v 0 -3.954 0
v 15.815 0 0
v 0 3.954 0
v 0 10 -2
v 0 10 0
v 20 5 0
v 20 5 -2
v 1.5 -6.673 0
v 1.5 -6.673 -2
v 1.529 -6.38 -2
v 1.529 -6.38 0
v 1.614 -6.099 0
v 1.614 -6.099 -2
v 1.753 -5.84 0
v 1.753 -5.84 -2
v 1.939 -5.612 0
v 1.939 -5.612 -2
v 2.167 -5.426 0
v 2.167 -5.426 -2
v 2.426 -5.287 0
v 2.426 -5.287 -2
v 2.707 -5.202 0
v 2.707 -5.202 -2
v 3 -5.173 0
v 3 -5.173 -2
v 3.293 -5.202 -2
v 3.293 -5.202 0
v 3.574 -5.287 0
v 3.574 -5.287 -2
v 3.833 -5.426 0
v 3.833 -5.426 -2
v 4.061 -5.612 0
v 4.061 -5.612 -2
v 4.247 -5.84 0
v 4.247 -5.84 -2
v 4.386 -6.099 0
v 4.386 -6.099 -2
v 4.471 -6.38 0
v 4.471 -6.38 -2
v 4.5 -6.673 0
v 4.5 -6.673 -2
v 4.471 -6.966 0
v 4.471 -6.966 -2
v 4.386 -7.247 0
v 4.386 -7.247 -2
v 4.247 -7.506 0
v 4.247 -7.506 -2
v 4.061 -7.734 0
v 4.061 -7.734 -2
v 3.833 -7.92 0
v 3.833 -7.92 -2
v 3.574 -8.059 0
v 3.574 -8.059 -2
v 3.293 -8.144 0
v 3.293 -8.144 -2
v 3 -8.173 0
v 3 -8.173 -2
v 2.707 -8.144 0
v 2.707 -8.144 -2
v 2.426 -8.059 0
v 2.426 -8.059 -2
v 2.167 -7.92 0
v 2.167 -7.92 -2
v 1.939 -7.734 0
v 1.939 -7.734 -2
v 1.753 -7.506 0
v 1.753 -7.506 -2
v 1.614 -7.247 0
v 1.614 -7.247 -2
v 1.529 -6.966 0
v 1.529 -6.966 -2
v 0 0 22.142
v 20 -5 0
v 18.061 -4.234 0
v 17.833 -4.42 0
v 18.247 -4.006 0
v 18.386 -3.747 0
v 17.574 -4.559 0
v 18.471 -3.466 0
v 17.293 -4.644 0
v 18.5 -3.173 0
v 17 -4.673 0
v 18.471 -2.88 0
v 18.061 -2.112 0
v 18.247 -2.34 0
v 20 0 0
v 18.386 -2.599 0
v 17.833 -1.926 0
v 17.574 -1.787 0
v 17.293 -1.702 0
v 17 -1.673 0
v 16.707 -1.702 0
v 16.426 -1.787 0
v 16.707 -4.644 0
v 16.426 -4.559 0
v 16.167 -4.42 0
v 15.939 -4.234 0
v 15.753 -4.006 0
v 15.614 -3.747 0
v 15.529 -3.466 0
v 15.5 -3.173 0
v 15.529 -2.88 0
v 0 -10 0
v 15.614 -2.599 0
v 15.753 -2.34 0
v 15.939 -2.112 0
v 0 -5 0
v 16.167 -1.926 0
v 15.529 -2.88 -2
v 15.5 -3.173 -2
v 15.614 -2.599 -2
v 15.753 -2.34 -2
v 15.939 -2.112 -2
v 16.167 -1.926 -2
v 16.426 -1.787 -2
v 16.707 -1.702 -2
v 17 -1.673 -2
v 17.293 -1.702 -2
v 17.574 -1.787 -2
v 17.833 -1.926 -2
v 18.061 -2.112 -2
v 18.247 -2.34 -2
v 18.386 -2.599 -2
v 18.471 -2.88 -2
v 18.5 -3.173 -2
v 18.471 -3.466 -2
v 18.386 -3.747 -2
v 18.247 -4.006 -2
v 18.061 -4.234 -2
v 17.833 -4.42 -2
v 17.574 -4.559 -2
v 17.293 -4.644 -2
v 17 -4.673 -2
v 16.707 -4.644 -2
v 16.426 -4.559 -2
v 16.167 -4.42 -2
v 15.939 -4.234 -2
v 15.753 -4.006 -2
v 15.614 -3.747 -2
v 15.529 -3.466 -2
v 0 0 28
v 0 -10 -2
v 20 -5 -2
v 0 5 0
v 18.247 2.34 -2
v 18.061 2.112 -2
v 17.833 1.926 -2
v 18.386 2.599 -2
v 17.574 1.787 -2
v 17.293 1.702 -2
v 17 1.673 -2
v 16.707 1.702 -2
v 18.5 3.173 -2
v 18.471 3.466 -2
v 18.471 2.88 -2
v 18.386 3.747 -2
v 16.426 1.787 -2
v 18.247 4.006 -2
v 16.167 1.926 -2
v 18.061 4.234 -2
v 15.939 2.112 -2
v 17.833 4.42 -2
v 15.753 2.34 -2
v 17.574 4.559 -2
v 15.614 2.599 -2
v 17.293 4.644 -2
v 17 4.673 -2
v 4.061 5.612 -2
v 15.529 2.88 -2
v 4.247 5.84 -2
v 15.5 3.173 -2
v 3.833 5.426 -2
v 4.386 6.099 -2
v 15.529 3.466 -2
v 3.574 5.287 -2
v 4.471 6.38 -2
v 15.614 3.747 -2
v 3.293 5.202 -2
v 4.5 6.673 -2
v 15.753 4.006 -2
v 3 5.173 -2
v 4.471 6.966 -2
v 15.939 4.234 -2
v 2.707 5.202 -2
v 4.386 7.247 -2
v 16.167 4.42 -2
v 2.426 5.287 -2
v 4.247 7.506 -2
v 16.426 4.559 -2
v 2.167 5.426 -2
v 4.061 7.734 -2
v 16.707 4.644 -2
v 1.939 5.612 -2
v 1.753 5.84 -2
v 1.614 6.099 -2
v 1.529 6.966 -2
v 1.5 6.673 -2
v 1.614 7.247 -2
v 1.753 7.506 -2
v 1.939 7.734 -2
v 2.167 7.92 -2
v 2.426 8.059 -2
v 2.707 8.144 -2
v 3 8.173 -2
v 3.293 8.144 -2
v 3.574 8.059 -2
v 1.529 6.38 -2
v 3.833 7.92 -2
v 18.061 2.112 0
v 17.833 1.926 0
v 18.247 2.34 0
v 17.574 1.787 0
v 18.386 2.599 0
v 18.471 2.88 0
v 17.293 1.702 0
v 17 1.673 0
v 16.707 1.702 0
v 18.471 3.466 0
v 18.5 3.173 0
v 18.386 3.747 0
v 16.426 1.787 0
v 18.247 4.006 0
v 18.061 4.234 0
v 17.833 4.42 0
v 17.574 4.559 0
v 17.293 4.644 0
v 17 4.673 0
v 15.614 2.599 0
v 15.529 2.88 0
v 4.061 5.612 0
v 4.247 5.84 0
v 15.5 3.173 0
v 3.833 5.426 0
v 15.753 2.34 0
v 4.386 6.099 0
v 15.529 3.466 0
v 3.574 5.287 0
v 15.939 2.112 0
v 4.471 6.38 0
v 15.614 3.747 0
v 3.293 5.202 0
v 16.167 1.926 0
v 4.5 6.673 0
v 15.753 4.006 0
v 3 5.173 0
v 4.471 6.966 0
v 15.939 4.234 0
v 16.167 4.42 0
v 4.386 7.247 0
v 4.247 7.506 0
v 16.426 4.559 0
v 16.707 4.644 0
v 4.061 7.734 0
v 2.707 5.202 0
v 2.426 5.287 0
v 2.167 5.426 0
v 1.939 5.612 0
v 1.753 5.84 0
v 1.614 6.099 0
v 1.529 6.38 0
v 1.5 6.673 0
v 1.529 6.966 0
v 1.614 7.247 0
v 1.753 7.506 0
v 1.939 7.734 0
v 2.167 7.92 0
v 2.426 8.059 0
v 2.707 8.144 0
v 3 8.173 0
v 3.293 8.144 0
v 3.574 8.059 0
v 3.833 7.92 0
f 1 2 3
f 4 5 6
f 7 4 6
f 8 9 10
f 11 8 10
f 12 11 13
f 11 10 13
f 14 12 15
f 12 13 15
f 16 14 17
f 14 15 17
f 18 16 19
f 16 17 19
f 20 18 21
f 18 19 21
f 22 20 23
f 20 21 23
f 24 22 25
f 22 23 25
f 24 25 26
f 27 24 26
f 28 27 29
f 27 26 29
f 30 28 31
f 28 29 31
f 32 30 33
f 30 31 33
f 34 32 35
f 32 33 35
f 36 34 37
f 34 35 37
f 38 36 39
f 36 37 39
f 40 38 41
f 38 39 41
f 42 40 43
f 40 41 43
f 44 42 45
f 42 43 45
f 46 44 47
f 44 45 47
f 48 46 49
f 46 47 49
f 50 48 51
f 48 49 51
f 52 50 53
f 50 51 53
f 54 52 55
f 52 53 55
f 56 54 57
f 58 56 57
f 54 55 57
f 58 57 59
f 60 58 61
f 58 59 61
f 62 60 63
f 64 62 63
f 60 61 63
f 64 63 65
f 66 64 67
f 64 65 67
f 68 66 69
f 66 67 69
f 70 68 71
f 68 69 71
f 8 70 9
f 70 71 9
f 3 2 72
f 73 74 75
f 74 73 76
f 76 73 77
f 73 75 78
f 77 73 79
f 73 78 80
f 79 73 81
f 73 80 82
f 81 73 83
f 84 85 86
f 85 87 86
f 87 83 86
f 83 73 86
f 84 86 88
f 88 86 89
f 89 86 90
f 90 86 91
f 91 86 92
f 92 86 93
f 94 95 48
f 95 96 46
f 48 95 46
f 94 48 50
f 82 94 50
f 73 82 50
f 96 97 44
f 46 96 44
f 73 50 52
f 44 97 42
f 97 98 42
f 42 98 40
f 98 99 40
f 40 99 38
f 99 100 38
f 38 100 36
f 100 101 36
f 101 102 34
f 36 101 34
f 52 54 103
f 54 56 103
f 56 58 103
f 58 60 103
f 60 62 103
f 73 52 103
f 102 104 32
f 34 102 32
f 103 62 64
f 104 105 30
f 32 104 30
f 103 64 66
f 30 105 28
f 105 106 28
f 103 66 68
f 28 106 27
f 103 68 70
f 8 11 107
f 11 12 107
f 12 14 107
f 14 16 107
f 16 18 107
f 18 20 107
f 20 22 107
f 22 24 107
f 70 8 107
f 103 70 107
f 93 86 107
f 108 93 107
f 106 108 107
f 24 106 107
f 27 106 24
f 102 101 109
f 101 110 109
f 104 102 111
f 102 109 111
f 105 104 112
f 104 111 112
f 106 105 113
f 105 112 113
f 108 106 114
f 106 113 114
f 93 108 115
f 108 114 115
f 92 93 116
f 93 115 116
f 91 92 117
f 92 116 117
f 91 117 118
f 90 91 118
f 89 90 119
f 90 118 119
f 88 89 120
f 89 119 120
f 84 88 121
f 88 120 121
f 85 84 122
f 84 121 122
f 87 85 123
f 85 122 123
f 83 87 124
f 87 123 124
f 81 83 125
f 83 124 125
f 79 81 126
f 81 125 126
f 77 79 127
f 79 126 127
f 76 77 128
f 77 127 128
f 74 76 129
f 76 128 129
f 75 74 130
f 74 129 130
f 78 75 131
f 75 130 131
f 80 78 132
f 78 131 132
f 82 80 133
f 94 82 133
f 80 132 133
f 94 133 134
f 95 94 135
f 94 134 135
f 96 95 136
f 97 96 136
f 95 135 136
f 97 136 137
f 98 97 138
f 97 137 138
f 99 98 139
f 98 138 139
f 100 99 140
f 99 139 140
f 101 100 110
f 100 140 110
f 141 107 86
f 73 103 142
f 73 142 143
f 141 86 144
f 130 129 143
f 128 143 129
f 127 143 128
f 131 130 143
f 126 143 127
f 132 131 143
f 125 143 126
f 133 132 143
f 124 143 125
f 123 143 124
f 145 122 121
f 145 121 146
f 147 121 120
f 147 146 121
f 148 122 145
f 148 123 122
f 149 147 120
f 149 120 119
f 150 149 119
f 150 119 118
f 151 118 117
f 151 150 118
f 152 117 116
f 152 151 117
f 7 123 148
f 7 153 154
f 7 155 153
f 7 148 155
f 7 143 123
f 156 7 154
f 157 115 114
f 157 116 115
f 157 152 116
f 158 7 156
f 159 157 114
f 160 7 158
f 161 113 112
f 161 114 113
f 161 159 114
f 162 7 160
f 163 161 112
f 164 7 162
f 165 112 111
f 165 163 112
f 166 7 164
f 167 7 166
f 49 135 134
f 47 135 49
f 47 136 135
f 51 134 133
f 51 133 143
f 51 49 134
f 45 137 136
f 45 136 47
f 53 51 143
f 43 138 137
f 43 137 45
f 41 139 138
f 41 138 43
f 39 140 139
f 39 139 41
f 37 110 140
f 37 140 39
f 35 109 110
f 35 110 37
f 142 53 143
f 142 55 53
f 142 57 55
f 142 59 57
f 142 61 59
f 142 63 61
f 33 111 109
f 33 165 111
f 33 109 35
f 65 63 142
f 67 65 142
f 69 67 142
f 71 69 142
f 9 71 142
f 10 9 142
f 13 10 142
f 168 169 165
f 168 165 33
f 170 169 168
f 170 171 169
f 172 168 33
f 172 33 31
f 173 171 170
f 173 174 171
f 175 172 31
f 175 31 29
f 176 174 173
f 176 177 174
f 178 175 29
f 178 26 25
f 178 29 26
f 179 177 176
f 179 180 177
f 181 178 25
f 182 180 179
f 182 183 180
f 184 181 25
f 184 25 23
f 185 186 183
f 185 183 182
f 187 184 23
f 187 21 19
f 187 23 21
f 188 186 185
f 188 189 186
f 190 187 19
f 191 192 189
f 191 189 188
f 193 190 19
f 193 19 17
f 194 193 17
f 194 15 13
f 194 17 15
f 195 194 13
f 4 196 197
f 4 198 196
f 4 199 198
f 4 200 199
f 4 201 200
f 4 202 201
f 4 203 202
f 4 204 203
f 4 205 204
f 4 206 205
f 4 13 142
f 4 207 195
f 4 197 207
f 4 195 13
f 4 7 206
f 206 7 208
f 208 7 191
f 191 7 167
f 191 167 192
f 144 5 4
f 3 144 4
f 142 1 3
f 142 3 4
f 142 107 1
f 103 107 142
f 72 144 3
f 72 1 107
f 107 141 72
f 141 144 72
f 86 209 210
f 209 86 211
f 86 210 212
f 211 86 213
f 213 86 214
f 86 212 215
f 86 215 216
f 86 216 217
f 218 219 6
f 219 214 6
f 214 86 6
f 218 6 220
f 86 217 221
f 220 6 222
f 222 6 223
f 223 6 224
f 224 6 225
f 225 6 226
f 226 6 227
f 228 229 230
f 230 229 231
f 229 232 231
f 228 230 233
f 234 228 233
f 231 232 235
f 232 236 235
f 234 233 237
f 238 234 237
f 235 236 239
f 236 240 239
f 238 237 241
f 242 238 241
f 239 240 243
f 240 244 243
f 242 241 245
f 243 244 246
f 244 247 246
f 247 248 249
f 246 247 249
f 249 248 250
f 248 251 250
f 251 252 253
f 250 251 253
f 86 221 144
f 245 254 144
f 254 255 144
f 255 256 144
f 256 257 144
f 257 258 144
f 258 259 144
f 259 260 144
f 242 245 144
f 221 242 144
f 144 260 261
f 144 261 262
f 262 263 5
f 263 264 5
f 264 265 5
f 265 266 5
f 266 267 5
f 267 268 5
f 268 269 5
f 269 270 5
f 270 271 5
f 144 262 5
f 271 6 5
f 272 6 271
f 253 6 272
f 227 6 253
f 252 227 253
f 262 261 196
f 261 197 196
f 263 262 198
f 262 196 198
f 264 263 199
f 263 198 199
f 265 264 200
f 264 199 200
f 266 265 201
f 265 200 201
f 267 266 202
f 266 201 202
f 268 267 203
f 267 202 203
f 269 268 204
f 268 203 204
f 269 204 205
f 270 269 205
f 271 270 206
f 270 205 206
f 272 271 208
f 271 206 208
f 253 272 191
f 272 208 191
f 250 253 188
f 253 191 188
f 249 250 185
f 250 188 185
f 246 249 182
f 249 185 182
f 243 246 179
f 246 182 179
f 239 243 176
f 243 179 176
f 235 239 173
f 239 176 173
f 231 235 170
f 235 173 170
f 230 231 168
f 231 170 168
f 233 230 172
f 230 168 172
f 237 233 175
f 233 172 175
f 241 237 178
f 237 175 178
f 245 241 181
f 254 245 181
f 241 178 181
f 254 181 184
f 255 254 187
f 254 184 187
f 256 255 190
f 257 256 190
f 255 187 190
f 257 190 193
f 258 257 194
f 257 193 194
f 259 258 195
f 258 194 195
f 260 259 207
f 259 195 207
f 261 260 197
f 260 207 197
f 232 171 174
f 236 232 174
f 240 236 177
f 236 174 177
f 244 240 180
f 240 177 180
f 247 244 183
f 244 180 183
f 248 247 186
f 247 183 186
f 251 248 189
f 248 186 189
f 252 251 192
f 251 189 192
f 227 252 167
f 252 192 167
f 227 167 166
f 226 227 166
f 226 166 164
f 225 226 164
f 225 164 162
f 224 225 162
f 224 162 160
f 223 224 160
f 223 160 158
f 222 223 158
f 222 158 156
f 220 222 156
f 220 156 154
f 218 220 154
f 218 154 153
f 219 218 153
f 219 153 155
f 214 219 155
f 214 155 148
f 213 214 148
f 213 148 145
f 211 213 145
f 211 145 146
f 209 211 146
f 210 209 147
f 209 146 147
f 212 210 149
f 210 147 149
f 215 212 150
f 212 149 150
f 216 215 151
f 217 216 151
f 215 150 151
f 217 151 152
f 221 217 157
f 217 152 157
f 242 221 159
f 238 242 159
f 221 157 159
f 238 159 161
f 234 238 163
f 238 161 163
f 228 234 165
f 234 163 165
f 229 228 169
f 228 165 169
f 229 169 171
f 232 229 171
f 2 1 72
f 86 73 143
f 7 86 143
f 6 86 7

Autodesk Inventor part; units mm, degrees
ref_plane "YZ Plane" through (0, 0, 0) normal (1, 0, 0) x (0, 1, 0)
ref_plane "XZ Plane" through (0, 0, 0) normal (0, 1, 0) x (-1, 0, 0)
ref_plane "XY Plane" through (0, 0, 0) normal (0, 0, 1) x (1, 0, 0)
sketch "草图1" plane through (0, 0, 0) normal (0, 0, 1) x (1, 0, 0)
  line L0 (0, 5) -> (20, 0)
  line L1 (20, 0) -> (0, -5)
  line L2 (0, -5) -> (0, 5)
  point P0 (0, 0)
  point P1 (0, 0)
  dimension "d0" = 10
  dimension "d1" = 20
sketch "草图2" plane through (0, 0, 0) normal (1, 0, 0) x (0, 1, 0)
  point P0 (0, 0)
  point P1 (0, 28)
  dimension "d2" = 28
loft "放样1" add profiles "草图1" section 2 point at (0, 0, 28)
shell "抽壳1" thickness 1 removed faces 2 at (6.6667, 0, 0) at (0, 0, 9.3333)
sketch "草图3" plane through (0, 3.9539, 0) normal (0, 0, -1) x (-1, 0, 0)
  line L0 (0, -13.9539) -> (-20, -13.9539)
  line L1 (-20, -13.9539) -> (-20, 6.0461)
  line L2 (-20, 6.0461) -> (0, 6.0461)
  line L3 (0, 6.0461) -> (0, -13.9539)
  line L4 (0, -13.9539) -> (-20, -8.9539)
  line L5 (0, 6.0461) -> (-20, 1.0461)
  line L6 (-20, -3.9539) -> (0, -8.9539) projected
  line L7 (0, 1.0461) -> (-20, -3.9539) projected
  point P0 (0, -3.9539)
  point P1 (0, -3.9539)
  dimension "d8" = 20
extrude "拉伸1" add sketch "草图3" along normal blind 2 contours L4 L1 L6 L3 | L6 L7 L3 | L7 L1 L5 L3
sketch "草图4" plane through (0, 3.9539, -2) normal (0, 0, -1) x (-1, 0, 0)
  circle A0 centre (-3, -10.6269) radius 1.5
  line L0 (-20, -8.9539) -> (0, -13.9539) projected
  circle A1 centre (-17, -7.1269) radius 1.5
  circle A2 centre (-3, 2.7192) radius 1.5
  circle A3 centre (-17, -0.7808) radius 1.5
  line L1 (0, 6.0461) -> (-20, 1.0461) projected
  line L2 (-20, 1.0461) -> (-20, -8.9539) projected
  line L3 (0, -13.9539) -> (0, 6.0461) projected
  point P0 (0, -3.9539)
  dimension "d11" = 3
  dimension "d12" = 2.5
  dimension "d13" = 3
  dimension "d14" = 3
  dimension "d15" = 3
  dimension "d16" = 2.5
  dimension "d17" = 2.5
  dimension "d18" = 2.5
  dimension "d19" = 3
  dimension "d20" = 3
  dimension "d21" = 3
  dimension "d22" = 3
extrude "拉伸2" cut sketch "草图4" against normal through all contours A0 | A1 | A2 | A3
properties part number "分离前导形片"
